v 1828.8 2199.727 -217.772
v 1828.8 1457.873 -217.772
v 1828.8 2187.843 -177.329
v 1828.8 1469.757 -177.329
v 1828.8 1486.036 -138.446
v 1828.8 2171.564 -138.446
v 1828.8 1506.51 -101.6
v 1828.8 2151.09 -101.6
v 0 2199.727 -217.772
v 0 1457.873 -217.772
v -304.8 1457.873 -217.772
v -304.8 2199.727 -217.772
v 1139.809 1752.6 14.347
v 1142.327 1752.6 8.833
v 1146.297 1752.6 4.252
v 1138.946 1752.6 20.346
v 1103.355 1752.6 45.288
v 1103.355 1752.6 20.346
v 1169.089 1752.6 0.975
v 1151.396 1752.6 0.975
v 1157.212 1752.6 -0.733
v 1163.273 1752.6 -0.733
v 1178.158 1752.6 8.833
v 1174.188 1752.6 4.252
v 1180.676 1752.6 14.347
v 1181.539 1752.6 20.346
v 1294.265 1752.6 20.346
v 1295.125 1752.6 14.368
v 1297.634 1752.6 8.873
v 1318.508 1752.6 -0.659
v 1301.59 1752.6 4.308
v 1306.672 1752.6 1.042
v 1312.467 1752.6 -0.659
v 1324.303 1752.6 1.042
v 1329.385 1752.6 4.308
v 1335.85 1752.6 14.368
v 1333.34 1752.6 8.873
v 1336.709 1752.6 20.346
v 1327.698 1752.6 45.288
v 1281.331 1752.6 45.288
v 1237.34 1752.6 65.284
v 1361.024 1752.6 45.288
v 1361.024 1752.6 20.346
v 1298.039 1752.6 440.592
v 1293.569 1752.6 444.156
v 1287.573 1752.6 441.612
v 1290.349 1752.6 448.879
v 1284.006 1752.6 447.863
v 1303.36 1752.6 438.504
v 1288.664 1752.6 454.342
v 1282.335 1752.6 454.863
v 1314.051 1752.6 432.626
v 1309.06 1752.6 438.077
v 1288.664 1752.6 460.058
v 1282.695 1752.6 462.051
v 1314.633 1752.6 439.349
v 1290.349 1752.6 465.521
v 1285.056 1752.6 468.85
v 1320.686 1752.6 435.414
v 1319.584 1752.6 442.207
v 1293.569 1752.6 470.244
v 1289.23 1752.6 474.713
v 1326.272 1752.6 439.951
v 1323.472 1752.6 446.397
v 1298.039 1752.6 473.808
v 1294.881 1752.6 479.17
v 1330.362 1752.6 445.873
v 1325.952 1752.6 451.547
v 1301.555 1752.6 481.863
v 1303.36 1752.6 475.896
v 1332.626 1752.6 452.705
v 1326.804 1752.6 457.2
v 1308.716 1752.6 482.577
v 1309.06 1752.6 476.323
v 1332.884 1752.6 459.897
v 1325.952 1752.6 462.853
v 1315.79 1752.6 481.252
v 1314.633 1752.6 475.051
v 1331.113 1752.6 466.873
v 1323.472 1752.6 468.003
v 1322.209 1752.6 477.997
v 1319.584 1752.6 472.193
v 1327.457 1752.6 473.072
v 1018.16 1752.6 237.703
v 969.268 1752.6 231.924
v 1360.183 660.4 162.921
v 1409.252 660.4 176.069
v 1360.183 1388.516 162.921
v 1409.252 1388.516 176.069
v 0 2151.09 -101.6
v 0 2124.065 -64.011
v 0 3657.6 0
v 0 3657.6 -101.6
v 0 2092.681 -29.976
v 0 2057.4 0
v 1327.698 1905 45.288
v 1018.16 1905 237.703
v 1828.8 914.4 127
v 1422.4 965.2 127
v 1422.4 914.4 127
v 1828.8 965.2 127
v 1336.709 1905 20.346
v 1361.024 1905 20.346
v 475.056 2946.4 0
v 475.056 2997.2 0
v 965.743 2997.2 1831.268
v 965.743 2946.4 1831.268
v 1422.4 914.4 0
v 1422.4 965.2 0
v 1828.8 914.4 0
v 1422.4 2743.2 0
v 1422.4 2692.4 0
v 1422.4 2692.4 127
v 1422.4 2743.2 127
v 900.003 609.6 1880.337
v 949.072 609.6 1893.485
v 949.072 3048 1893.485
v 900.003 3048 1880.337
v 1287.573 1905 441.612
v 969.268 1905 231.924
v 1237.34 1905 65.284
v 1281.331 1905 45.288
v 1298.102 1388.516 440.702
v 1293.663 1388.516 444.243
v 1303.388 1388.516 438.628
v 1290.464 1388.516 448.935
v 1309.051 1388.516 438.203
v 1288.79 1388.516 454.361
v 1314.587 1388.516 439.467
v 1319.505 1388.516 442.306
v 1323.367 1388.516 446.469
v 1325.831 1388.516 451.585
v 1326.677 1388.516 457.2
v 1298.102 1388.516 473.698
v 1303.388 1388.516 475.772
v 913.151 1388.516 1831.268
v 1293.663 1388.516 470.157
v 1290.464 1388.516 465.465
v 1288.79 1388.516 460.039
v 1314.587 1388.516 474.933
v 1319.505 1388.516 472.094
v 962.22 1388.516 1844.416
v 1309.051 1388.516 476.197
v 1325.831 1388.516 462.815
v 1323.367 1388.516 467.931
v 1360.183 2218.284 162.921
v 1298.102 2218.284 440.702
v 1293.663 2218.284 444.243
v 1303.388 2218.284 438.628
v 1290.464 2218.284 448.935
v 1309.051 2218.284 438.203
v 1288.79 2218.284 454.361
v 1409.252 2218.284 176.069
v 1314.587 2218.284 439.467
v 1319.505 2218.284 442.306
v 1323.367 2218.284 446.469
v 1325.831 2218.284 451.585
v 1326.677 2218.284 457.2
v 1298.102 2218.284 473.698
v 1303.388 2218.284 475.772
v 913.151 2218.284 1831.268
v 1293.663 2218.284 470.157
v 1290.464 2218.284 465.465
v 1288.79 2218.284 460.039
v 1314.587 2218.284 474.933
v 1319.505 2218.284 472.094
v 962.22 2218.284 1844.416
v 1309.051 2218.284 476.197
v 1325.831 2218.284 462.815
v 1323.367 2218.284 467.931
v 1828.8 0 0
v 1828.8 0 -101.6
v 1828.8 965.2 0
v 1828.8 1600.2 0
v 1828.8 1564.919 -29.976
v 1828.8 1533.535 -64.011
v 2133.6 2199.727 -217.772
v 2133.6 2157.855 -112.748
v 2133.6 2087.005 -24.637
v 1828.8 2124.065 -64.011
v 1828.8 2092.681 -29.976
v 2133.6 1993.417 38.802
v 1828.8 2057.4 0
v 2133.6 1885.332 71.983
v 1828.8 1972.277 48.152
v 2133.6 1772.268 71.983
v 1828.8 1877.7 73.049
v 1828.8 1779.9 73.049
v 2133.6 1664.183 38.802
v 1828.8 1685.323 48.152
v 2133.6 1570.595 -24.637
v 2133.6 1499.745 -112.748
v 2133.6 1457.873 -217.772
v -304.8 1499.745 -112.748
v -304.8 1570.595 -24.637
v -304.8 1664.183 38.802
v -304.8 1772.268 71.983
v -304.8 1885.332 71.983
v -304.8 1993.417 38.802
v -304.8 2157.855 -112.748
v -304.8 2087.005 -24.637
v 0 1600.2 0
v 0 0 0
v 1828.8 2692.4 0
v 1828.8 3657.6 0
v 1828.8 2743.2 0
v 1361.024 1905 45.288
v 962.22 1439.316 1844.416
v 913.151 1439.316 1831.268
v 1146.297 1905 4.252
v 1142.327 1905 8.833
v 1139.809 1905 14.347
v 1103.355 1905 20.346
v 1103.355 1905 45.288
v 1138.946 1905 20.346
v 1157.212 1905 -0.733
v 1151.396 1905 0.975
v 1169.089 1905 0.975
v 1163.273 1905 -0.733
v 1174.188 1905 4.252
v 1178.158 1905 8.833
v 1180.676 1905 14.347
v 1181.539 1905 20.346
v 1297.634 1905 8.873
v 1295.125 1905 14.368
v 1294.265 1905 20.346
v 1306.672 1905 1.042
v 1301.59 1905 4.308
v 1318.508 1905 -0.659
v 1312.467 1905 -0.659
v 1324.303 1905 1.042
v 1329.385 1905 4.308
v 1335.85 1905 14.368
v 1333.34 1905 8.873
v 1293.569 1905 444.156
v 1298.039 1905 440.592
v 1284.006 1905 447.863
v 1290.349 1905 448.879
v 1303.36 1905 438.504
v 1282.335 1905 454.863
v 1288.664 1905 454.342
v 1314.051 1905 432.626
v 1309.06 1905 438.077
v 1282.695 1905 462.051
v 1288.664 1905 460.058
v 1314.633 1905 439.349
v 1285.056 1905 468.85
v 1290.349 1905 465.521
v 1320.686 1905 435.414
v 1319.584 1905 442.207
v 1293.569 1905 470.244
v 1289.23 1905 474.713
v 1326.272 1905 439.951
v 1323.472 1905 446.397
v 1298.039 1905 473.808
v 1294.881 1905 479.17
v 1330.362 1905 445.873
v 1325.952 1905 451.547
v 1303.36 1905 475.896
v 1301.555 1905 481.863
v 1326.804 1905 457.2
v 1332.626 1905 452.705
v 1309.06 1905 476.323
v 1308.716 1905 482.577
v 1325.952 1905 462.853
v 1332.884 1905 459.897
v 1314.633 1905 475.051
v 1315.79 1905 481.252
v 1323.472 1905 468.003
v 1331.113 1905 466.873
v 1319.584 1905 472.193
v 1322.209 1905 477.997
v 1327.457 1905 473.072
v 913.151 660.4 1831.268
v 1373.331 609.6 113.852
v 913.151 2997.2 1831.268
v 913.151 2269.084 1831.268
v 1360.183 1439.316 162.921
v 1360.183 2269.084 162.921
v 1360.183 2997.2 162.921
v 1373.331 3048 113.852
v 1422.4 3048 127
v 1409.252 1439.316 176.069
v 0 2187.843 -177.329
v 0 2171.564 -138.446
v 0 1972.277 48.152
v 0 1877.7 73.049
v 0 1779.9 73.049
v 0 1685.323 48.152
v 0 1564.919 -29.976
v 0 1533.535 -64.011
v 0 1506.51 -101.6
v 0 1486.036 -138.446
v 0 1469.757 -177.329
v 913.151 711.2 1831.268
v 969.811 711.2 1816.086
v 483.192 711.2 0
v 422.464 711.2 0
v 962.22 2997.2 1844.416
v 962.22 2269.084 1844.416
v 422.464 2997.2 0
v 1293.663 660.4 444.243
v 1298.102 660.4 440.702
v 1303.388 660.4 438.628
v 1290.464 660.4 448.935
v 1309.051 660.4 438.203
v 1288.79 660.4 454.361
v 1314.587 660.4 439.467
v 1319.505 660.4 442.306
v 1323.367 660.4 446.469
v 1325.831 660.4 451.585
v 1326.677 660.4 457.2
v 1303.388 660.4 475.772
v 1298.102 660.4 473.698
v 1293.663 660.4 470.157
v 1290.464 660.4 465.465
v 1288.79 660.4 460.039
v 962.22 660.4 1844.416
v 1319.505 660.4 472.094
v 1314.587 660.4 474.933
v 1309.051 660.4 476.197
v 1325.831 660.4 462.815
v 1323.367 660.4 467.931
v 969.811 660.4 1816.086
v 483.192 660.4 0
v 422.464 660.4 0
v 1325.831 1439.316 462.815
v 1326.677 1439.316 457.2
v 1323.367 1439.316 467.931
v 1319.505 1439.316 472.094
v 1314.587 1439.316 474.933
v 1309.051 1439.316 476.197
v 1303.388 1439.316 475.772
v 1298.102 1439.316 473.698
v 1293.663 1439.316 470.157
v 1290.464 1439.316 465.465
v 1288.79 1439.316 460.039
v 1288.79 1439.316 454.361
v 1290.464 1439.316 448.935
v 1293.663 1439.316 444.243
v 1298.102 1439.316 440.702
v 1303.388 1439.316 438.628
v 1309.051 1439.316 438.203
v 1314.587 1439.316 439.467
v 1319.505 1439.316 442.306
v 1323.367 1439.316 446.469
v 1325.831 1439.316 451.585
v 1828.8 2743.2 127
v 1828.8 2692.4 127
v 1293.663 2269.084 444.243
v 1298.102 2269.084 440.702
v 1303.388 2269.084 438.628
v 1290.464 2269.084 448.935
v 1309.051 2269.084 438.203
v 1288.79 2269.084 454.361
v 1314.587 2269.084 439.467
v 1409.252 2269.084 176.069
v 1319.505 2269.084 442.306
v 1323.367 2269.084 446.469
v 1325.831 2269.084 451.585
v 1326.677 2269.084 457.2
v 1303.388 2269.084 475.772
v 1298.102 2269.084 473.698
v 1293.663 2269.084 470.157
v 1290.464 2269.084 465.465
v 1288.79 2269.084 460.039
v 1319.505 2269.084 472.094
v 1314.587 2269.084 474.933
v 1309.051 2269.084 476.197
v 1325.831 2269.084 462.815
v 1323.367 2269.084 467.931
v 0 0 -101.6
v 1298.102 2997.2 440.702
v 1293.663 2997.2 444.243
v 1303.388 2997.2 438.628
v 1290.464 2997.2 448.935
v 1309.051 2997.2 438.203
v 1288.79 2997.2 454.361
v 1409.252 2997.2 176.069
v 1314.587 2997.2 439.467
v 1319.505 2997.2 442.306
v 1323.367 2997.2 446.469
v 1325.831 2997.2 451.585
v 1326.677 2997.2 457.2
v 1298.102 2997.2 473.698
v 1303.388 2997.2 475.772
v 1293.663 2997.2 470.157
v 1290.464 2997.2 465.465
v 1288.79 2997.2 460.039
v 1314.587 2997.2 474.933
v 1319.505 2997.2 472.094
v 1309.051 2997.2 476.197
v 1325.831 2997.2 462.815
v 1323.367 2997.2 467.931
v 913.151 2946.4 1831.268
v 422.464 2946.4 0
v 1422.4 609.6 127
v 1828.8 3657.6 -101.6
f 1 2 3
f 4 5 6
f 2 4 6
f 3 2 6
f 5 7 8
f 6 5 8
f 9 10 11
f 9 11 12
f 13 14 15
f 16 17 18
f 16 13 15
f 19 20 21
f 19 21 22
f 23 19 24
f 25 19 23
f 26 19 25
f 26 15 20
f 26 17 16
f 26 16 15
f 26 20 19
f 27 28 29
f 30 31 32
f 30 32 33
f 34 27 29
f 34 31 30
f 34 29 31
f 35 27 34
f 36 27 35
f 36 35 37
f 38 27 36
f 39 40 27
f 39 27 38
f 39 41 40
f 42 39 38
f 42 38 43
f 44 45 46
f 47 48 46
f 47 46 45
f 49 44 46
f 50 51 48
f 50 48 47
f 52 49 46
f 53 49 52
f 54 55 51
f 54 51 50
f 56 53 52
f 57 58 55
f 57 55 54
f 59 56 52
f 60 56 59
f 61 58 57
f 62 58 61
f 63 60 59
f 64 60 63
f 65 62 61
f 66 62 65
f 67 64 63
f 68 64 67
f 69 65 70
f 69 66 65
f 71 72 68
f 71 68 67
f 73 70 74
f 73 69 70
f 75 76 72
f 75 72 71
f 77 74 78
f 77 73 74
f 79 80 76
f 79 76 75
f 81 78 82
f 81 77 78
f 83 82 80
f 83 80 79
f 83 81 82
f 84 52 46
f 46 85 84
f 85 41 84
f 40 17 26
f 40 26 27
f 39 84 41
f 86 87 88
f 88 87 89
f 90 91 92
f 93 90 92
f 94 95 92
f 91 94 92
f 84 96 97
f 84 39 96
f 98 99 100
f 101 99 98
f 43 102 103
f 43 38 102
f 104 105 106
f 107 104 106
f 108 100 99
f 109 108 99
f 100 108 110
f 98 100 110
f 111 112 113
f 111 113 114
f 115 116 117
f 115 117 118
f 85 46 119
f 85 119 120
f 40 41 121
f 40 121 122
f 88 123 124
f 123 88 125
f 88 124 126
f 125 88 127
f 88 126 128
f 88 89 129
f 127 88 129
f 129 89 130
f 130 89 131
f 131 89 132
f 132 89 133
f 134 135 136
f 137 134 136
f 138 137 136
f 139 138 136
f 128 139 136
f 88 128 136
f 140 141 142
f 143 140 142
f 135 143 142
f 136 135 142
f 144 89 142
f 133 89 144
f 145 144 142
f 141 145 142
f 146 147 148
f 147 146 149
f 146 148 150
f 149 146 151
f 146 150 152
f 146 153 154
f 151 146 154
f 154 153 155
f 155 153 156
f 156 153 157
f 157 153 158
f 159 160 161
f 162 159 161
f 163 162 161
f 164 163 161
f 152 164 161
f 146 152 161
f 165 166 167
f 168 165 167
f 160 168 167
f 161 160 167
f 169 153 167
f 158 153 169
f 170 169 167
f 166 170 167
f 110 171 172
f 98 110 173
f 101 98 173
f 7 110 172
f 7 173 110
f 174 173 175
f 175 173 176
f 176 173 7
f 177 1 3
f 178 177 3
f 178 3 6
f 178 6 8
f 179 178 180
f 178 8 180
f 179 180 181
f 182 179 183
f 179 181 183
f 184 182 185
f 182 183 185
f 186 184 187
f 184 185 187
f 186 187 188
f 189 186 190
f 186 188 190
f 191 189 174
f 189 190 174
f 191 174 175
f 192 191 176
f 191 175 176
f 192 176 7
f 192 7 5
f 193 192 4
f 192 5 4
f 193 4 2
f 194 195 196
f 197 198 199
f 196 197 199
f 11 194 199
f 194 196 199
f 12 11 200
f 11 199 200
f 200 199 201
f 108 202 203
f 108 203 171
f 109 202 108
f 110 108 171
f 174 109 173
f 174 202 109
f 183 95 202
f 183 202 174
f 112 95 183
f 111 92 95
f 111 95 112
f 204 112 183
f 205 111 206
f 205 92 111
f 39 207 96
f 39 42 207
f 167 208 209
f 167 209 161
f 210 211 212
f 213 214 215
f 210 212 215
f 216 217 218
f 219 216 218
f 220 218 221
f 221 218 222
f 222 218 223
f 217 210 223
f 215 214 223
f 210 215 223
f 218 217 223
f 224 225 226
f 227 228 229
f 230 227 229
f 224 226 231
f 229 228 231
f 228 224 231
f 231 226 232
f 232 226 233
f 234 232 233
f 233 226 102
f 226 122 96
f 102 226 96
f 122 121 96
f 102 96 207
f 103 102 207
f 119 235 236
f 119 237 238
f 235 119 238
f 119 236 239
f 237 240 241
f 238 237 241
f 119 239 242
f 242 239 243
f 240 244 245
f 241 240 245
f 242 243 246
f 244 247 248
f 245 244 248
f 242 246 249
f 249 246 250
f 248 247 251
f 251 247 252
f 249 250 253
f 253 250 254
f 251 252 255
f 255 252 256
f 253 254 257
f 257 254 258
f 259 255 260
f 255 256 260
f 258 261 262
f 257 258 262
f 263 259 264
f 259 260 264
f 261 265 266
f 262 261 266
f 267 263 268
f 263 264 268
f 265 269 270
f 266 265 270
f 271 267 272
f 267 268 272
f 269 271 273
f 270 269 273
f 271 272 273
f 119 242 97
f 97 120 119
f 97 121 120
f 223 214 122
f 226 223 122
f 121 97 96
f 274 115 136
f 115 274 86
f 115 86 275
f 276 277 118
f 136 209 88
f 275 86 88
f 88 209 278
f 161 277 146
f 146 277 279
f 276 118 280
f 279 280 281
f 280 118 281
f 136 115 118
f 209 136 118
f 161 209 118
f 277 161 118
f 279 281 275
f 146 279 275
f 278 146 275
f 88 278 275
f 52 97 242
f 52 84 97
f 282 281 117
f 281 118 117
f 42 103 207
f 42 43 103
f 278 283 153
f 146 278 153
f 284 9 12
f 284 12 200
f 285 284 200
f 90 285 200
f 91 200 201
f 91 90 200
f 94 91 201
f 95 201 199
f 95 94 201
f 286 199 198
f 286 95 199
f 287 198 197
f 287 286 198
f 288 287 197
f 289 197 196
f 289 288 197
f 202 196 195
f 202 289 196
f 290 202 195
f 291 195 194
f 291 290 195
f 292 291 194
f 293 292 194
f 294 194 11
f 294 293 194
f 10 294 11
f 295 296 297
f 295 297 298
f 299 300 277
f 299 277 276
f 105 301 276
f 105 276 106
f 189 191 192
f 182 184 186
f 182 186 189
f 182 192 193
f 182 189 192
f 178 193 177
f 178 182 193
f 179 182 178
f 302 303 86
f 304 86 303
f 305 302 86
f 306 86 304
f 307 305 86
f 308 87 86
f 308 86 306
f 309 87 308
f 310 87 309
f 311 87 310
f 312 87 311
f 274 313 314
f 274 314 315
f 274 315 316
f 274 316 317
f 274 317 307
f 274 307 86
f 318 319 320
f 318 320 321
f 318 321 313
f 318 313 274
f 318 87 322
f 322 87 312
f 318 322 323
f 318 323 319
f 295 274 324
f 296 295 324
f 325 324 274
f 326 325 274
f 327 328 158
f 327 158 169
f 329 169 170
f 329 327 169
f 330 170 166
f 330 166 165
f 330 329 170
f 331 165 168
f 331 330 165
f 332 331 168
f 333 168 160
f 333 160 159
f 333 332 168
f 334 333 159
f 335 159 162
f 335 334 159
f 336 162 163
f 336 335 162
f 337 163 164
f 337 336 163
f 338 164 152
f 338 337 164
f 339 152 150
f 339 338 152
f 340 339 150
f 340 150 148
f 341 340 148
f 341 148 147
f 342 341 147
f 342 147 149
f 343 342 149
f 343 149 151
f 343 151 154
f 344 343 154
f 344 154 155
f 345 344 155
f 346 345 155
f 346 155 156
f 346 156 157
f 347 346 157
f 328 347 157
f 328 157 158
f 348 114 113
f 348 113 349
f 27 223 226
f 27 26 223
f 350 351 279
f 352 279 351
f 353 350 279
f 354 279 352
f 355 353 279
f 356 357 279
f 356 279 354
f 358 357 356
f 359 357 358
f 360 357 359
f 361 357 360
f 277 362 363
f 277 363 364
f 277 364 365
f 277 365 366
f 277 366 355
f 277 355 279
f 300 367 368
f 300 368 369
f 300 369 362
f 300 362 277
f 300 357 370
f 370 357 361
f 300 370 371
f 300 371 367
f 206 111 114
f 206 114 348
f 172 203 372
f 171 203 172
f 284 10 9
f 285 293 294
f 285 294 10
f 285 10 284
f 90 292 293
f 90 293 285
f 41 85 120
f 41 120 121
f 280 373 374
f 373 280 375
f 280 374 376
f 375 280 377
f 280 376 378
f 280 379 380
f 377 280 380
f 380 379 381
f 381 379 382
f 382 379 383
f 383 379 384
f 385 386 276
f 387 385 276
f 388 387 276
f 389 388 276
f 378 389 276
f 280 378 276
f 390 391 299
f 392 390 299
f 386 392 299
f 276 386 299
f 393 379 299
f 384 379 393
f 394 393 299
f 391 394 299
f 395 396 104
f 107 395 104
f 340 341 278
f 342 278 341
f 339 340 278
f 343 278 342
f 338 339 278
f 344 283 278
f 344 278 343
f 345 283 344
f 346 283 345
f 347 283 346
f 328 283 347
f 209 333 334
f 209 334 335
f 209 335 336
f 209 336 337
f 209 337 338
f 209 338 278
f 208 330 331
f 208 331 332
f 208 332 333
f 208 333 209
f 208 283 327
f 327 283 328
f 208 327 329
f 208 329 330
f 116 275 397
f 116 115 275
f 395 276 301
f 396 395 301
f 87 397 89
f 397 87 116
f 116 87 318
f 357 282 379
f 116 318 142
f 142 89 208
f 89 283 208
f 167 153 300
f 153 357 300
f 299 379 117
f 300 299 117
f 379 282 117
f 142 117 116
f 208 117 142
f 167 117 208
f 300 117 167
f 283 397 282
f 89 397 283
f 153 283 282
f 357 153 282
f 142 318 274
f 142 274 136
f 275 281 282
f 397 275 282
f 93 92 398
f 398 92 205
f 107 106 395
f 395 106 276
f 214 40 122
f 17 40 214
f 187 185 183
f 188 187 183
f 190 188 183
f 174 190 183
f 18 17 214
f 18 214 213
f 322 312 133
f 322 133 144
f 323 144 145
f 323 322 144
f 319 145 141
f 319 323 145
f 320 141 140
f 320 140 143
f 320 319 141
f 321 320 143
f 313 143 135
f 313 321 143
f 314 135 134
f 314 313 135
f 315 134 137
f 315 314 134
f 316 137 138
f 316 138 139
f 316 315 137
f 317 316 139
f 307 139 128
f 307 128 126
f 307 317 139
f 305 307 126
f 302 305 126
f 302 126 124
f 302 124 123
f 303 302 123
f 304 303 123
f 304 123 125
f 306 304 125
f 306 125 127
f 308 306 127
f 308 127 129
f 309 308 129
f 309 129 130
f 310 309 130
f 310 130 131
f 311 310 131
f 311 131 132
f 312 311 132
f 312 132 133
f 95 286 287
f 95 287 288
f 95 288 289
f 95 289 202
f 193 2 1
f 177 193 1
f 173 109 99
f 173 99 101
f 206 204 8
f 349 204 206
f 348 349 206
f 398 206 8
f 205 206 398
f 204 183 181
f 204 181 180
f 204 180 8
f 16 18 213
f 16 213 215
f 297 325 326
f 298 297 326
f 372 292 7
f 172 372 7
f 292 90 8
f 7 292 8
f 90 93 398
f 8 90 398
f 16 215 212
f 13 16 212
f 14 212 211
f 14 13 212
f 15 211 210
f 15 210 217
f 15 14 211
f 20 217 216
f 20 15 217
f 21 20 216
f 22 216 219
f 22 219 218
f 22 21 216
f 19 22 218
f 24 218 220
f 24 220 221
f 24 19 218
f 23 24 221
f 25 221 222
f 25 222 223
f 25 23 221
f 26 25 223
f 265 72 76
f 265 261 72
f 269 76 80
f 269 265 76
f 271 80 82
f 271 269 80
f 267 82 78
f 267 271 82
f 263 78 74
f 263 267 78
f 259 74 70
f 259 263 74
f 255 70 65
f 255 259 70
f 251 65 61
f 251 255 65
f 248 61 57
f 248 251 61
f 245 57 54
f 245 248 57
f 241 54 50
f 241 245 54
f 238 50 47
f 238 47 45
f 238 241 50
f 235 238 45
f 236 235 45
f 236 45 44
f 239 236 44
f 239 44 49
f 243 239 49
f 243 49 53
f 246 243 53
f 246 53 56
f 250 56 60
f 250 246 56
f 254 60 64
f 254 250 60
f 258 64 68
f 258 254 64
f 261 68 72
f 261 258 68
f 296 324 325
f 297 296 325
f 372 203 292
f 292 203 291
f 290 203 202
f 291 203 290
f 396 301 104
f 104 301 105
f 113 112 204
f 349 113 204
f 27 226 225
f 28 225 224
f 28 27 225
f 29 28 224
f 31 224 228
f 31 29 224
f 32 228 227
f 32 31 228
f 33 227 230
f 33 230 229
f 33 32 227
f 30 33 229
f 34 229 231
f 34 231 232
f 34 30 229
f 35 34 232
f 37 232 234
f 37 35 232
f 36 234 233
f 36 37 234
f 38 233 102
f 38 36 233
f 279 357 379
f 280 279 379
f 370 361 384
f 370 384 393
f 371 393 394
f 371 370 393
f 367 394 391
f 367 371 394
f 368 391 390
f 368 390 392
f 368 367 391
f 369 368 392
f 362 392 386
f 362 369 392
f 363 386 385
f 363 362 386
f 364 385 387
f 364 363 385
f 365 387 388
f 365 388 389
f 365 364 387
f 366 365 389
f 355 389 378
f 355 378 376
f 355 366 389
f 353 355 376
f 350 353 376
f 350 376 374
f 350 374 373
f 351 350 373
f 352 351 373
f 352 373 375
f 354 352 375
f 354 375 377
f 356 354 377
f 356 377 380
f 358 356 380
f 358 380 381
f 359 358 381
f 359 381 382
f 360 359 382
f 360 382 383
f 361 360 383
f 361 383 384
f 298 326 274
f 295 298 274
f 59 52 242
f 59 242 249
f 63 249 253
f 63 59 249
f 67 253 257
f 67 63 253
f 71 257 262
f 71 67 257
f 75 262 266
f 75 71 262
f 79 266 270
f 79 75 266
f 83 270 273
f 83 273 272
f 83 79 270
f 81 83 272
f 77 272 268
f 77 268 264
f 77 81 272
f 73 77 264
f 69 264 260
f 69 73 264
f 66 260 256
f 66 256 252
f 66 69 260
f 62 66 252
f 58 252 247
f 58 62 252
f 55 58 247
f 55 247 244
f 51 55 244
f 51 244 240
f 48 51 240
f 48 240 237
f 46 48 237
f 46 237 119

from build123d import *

# Parameters (mm, degrees)
F0_W      = 1828.8
F0_H      = 3657.6
F1_DEPTH  = 101.6
F3_DEPTH  = 304.8
F5_W      = 406.4
F5_H      = 50.8
F6_DEPTH  = 127
F8_DEPTH  = 2133.6
F9_DEPTH  = 304.8
F10_W     = 728.1164
F10_H     = 1727.2
F10_W_2   = 778.9672
F11_DEPTH = 1757.5817005799
F12_R     = 19.05
F13_DEPTH = 2438.4
F15_R     = 19.177
F16_DEPTH = 76.2
F18_DEPTH = 50.8
F20_DEPTH = 50.8


# Not quite as in the source:
# - a pattern or mirror of a feature is missing from the dataset's text; its kind, count and spacing are read off the source's solid


with BuildPart() as f1:
    # F0 (on Top) → F1 (new body)
    with BuildSketch(Plane.XY):
        with Locations((914.4, 1828.8)):
            Rectangle(F0_W, F0_H)
    extrude(amount=-F1_DEPTH)

    # F2 (on Right) → F3 (join)
    with BuildSketch(Plane.YZ):
        with BuildLine():
            Line((1457.8725633512, -217.7722070765), (2199.7274366488, -217.7722070765))
            ThreePointArc((2199.7274366488, -217.7722070765), (1828.8, 76.2), (1457.8725633512, -217.7722070765))
        make_face()
    f3 = extrude(amount=-F3_DEPTH)

    # F3_copies: F3 across plane
    add(f3.mirror(Plane(origin=(914.4, 0, 0), x_dir=(0, 0, 1), z_dir=(1, 0, 0))))

    # F5 (on face) → F6 (join)
    with BuildSketch(Plane.XY):
        with Locations((1625.6, 939.8)):
            Rectangle(F5_W, F5_H)
        with Locations((1625.6, 2717.8)):
            Rectangle(F5_W, F5_H)
    extrude(amount=F6_DEPTH)


with BuildPart() as f8:
    # F7 (on face) → F8 (new body)
    with BuildSketch(Plane.XZ.offset(-914.4)):
        Polygon((1373.3309680245, 113.8519925088), (1422.4, 127), (949.0717303165, 1893.4851511174), (900.002698341, 1880.3371436262), align=None)
    extrude(amount=-F8_DEPTH)

    # F7 (on face) → F9 (join)
    with BuildSketch(Plane.XZ.offset(-914.4)):
        Polygon((1373.3309680245, 113.8519925088), (1422.4, 127), (949.0717303165, 1893.4851511174), (900.002698341, 1880.3371436262), align=None)
    extrude(amount=F9_DEPTH)

    # F10 (on face) → F11 (cut, through all)
    with BuildSketch(Plane(origin=(1358.8672671715, 0, 364.1073868597), x_dir=(0, 1, 0), z_dir=(0.9659258263, 0, 0.2588190451))):
        with Locations((1024.4582, 668.9283701849)):
            Rectangle(F10_W, F10_H)
        with Locations((2633.1418, 668.9283701849)):
            Rectangle(F10_W, F10_H)
        with Locations((1828.8, 668.9283701849)):
            Rectangle(F10_W_2, F10_H)
    extrude(amount=-F11_DEPTH, mode=Mode.SUBTRACT)

    # F12 (on face) → F13 (join)
    with BuildSketch(Plane.XZ.offset(-609.6)):
        with Locations((1307.6271616768, 457.2)):
            Circle(F12_R)
    extrude(amount=-F13_DEPTH)


with BuildPart() as f16:
    # F15 (on offset) → F16 (new body, symmetric)
    with BuildSketch(Plane.XZ.offset(-1828.8)):
        with BuildLine():
            Line((1018.1603394521, 237.7031047405), (1314.0505465733, 432.6256205272))
            ThreePointArc((1314.0505465733, 432.6256205272), (1315.7904914246, 481.2524436894), (1287.5728110962, 441.6120872856))
            Line((1287.5728110962, 441.6120872856), (969.2683602777, 231.9238216842))
            Line((969.2683602777, 231.9238216842), (1237.3403362105, 65.2844932284))
            Line((1237.3403362105, 65.2844932284), (1281.3311466944, 45.2877443791))
            Line((1281.3311466944, 45.2877443791), (1103.3545091502, 45.2877443791))
            Line((1103.3545091502, 45.2877443791), (1103.3545091502, 20.3464620363))
            Line((1103.3545091502, 20.3464620363), (1138.9464007844, 20.3464620363))
            ThreePointArc((1138.9464007844, 20.3464620363), (1160.242493426, -0.9496306053), (1181.5385860676, 20.3464620363))
            Line((1181.5385860676, 20.3464620363), (1294.2654747231, 20.3464620363))
            ThreePointArc((1294.2654747231, 20.3464620363), (1315.4874399058, -0.8755031465), (1336.7094050886, 20.3464620363))
            Line((1336.7094050886, 20.3464620363), (1361.0237195842, 20.3464620363))
            Line((1361.0237195842, 20.3464620363), (1361.0237195842, 45.2877443791))
            Line((1361.0237195842, 45.2877443791), (1327.6981078161, 45.2877443791))
            Line((1327.6981078161, 45.2877443791), (1018.1603394521, 237.7031047405))
        make_face()
        with Locations((1307.6271616768, 457.2)):
            Circle(F15_R, mode=Mode.SUBTRACT)
    extrude(amount=F16_DEPTH, both=True)


with BuildPart() as f18:
    # F17 (on face) → F18 (new body)
    with BuildSketch(Plane(origin=(0, 660.4, 0), x_dir=(-1, 0, 0), z_dir=(0, 1, 0))):
        Polygon((-422.4638941905, 0), (-913.1507058322, 1831.2681116508), (-969.8107434721, 1816.086100322), (-483.1919395054, 0), align=None)
    extrude(amount=F18_DEPTH)


with BuildPart() as f20:
    # F19 (on face) → F20 (new body)
    with BuildSketch(Plane.XZ.offset(-2997.2)):
        Polygon((965.7427357971, 1831.2681116508), (913.1507058322, 1831.2681116508), (422.4638941905, 0), (475.0559241553, 0), align=None)
    extrude(amount=F20_DEPTH)


solid = Compound([f1.part, f8.part, f16.part, f18.part, f20.part])
